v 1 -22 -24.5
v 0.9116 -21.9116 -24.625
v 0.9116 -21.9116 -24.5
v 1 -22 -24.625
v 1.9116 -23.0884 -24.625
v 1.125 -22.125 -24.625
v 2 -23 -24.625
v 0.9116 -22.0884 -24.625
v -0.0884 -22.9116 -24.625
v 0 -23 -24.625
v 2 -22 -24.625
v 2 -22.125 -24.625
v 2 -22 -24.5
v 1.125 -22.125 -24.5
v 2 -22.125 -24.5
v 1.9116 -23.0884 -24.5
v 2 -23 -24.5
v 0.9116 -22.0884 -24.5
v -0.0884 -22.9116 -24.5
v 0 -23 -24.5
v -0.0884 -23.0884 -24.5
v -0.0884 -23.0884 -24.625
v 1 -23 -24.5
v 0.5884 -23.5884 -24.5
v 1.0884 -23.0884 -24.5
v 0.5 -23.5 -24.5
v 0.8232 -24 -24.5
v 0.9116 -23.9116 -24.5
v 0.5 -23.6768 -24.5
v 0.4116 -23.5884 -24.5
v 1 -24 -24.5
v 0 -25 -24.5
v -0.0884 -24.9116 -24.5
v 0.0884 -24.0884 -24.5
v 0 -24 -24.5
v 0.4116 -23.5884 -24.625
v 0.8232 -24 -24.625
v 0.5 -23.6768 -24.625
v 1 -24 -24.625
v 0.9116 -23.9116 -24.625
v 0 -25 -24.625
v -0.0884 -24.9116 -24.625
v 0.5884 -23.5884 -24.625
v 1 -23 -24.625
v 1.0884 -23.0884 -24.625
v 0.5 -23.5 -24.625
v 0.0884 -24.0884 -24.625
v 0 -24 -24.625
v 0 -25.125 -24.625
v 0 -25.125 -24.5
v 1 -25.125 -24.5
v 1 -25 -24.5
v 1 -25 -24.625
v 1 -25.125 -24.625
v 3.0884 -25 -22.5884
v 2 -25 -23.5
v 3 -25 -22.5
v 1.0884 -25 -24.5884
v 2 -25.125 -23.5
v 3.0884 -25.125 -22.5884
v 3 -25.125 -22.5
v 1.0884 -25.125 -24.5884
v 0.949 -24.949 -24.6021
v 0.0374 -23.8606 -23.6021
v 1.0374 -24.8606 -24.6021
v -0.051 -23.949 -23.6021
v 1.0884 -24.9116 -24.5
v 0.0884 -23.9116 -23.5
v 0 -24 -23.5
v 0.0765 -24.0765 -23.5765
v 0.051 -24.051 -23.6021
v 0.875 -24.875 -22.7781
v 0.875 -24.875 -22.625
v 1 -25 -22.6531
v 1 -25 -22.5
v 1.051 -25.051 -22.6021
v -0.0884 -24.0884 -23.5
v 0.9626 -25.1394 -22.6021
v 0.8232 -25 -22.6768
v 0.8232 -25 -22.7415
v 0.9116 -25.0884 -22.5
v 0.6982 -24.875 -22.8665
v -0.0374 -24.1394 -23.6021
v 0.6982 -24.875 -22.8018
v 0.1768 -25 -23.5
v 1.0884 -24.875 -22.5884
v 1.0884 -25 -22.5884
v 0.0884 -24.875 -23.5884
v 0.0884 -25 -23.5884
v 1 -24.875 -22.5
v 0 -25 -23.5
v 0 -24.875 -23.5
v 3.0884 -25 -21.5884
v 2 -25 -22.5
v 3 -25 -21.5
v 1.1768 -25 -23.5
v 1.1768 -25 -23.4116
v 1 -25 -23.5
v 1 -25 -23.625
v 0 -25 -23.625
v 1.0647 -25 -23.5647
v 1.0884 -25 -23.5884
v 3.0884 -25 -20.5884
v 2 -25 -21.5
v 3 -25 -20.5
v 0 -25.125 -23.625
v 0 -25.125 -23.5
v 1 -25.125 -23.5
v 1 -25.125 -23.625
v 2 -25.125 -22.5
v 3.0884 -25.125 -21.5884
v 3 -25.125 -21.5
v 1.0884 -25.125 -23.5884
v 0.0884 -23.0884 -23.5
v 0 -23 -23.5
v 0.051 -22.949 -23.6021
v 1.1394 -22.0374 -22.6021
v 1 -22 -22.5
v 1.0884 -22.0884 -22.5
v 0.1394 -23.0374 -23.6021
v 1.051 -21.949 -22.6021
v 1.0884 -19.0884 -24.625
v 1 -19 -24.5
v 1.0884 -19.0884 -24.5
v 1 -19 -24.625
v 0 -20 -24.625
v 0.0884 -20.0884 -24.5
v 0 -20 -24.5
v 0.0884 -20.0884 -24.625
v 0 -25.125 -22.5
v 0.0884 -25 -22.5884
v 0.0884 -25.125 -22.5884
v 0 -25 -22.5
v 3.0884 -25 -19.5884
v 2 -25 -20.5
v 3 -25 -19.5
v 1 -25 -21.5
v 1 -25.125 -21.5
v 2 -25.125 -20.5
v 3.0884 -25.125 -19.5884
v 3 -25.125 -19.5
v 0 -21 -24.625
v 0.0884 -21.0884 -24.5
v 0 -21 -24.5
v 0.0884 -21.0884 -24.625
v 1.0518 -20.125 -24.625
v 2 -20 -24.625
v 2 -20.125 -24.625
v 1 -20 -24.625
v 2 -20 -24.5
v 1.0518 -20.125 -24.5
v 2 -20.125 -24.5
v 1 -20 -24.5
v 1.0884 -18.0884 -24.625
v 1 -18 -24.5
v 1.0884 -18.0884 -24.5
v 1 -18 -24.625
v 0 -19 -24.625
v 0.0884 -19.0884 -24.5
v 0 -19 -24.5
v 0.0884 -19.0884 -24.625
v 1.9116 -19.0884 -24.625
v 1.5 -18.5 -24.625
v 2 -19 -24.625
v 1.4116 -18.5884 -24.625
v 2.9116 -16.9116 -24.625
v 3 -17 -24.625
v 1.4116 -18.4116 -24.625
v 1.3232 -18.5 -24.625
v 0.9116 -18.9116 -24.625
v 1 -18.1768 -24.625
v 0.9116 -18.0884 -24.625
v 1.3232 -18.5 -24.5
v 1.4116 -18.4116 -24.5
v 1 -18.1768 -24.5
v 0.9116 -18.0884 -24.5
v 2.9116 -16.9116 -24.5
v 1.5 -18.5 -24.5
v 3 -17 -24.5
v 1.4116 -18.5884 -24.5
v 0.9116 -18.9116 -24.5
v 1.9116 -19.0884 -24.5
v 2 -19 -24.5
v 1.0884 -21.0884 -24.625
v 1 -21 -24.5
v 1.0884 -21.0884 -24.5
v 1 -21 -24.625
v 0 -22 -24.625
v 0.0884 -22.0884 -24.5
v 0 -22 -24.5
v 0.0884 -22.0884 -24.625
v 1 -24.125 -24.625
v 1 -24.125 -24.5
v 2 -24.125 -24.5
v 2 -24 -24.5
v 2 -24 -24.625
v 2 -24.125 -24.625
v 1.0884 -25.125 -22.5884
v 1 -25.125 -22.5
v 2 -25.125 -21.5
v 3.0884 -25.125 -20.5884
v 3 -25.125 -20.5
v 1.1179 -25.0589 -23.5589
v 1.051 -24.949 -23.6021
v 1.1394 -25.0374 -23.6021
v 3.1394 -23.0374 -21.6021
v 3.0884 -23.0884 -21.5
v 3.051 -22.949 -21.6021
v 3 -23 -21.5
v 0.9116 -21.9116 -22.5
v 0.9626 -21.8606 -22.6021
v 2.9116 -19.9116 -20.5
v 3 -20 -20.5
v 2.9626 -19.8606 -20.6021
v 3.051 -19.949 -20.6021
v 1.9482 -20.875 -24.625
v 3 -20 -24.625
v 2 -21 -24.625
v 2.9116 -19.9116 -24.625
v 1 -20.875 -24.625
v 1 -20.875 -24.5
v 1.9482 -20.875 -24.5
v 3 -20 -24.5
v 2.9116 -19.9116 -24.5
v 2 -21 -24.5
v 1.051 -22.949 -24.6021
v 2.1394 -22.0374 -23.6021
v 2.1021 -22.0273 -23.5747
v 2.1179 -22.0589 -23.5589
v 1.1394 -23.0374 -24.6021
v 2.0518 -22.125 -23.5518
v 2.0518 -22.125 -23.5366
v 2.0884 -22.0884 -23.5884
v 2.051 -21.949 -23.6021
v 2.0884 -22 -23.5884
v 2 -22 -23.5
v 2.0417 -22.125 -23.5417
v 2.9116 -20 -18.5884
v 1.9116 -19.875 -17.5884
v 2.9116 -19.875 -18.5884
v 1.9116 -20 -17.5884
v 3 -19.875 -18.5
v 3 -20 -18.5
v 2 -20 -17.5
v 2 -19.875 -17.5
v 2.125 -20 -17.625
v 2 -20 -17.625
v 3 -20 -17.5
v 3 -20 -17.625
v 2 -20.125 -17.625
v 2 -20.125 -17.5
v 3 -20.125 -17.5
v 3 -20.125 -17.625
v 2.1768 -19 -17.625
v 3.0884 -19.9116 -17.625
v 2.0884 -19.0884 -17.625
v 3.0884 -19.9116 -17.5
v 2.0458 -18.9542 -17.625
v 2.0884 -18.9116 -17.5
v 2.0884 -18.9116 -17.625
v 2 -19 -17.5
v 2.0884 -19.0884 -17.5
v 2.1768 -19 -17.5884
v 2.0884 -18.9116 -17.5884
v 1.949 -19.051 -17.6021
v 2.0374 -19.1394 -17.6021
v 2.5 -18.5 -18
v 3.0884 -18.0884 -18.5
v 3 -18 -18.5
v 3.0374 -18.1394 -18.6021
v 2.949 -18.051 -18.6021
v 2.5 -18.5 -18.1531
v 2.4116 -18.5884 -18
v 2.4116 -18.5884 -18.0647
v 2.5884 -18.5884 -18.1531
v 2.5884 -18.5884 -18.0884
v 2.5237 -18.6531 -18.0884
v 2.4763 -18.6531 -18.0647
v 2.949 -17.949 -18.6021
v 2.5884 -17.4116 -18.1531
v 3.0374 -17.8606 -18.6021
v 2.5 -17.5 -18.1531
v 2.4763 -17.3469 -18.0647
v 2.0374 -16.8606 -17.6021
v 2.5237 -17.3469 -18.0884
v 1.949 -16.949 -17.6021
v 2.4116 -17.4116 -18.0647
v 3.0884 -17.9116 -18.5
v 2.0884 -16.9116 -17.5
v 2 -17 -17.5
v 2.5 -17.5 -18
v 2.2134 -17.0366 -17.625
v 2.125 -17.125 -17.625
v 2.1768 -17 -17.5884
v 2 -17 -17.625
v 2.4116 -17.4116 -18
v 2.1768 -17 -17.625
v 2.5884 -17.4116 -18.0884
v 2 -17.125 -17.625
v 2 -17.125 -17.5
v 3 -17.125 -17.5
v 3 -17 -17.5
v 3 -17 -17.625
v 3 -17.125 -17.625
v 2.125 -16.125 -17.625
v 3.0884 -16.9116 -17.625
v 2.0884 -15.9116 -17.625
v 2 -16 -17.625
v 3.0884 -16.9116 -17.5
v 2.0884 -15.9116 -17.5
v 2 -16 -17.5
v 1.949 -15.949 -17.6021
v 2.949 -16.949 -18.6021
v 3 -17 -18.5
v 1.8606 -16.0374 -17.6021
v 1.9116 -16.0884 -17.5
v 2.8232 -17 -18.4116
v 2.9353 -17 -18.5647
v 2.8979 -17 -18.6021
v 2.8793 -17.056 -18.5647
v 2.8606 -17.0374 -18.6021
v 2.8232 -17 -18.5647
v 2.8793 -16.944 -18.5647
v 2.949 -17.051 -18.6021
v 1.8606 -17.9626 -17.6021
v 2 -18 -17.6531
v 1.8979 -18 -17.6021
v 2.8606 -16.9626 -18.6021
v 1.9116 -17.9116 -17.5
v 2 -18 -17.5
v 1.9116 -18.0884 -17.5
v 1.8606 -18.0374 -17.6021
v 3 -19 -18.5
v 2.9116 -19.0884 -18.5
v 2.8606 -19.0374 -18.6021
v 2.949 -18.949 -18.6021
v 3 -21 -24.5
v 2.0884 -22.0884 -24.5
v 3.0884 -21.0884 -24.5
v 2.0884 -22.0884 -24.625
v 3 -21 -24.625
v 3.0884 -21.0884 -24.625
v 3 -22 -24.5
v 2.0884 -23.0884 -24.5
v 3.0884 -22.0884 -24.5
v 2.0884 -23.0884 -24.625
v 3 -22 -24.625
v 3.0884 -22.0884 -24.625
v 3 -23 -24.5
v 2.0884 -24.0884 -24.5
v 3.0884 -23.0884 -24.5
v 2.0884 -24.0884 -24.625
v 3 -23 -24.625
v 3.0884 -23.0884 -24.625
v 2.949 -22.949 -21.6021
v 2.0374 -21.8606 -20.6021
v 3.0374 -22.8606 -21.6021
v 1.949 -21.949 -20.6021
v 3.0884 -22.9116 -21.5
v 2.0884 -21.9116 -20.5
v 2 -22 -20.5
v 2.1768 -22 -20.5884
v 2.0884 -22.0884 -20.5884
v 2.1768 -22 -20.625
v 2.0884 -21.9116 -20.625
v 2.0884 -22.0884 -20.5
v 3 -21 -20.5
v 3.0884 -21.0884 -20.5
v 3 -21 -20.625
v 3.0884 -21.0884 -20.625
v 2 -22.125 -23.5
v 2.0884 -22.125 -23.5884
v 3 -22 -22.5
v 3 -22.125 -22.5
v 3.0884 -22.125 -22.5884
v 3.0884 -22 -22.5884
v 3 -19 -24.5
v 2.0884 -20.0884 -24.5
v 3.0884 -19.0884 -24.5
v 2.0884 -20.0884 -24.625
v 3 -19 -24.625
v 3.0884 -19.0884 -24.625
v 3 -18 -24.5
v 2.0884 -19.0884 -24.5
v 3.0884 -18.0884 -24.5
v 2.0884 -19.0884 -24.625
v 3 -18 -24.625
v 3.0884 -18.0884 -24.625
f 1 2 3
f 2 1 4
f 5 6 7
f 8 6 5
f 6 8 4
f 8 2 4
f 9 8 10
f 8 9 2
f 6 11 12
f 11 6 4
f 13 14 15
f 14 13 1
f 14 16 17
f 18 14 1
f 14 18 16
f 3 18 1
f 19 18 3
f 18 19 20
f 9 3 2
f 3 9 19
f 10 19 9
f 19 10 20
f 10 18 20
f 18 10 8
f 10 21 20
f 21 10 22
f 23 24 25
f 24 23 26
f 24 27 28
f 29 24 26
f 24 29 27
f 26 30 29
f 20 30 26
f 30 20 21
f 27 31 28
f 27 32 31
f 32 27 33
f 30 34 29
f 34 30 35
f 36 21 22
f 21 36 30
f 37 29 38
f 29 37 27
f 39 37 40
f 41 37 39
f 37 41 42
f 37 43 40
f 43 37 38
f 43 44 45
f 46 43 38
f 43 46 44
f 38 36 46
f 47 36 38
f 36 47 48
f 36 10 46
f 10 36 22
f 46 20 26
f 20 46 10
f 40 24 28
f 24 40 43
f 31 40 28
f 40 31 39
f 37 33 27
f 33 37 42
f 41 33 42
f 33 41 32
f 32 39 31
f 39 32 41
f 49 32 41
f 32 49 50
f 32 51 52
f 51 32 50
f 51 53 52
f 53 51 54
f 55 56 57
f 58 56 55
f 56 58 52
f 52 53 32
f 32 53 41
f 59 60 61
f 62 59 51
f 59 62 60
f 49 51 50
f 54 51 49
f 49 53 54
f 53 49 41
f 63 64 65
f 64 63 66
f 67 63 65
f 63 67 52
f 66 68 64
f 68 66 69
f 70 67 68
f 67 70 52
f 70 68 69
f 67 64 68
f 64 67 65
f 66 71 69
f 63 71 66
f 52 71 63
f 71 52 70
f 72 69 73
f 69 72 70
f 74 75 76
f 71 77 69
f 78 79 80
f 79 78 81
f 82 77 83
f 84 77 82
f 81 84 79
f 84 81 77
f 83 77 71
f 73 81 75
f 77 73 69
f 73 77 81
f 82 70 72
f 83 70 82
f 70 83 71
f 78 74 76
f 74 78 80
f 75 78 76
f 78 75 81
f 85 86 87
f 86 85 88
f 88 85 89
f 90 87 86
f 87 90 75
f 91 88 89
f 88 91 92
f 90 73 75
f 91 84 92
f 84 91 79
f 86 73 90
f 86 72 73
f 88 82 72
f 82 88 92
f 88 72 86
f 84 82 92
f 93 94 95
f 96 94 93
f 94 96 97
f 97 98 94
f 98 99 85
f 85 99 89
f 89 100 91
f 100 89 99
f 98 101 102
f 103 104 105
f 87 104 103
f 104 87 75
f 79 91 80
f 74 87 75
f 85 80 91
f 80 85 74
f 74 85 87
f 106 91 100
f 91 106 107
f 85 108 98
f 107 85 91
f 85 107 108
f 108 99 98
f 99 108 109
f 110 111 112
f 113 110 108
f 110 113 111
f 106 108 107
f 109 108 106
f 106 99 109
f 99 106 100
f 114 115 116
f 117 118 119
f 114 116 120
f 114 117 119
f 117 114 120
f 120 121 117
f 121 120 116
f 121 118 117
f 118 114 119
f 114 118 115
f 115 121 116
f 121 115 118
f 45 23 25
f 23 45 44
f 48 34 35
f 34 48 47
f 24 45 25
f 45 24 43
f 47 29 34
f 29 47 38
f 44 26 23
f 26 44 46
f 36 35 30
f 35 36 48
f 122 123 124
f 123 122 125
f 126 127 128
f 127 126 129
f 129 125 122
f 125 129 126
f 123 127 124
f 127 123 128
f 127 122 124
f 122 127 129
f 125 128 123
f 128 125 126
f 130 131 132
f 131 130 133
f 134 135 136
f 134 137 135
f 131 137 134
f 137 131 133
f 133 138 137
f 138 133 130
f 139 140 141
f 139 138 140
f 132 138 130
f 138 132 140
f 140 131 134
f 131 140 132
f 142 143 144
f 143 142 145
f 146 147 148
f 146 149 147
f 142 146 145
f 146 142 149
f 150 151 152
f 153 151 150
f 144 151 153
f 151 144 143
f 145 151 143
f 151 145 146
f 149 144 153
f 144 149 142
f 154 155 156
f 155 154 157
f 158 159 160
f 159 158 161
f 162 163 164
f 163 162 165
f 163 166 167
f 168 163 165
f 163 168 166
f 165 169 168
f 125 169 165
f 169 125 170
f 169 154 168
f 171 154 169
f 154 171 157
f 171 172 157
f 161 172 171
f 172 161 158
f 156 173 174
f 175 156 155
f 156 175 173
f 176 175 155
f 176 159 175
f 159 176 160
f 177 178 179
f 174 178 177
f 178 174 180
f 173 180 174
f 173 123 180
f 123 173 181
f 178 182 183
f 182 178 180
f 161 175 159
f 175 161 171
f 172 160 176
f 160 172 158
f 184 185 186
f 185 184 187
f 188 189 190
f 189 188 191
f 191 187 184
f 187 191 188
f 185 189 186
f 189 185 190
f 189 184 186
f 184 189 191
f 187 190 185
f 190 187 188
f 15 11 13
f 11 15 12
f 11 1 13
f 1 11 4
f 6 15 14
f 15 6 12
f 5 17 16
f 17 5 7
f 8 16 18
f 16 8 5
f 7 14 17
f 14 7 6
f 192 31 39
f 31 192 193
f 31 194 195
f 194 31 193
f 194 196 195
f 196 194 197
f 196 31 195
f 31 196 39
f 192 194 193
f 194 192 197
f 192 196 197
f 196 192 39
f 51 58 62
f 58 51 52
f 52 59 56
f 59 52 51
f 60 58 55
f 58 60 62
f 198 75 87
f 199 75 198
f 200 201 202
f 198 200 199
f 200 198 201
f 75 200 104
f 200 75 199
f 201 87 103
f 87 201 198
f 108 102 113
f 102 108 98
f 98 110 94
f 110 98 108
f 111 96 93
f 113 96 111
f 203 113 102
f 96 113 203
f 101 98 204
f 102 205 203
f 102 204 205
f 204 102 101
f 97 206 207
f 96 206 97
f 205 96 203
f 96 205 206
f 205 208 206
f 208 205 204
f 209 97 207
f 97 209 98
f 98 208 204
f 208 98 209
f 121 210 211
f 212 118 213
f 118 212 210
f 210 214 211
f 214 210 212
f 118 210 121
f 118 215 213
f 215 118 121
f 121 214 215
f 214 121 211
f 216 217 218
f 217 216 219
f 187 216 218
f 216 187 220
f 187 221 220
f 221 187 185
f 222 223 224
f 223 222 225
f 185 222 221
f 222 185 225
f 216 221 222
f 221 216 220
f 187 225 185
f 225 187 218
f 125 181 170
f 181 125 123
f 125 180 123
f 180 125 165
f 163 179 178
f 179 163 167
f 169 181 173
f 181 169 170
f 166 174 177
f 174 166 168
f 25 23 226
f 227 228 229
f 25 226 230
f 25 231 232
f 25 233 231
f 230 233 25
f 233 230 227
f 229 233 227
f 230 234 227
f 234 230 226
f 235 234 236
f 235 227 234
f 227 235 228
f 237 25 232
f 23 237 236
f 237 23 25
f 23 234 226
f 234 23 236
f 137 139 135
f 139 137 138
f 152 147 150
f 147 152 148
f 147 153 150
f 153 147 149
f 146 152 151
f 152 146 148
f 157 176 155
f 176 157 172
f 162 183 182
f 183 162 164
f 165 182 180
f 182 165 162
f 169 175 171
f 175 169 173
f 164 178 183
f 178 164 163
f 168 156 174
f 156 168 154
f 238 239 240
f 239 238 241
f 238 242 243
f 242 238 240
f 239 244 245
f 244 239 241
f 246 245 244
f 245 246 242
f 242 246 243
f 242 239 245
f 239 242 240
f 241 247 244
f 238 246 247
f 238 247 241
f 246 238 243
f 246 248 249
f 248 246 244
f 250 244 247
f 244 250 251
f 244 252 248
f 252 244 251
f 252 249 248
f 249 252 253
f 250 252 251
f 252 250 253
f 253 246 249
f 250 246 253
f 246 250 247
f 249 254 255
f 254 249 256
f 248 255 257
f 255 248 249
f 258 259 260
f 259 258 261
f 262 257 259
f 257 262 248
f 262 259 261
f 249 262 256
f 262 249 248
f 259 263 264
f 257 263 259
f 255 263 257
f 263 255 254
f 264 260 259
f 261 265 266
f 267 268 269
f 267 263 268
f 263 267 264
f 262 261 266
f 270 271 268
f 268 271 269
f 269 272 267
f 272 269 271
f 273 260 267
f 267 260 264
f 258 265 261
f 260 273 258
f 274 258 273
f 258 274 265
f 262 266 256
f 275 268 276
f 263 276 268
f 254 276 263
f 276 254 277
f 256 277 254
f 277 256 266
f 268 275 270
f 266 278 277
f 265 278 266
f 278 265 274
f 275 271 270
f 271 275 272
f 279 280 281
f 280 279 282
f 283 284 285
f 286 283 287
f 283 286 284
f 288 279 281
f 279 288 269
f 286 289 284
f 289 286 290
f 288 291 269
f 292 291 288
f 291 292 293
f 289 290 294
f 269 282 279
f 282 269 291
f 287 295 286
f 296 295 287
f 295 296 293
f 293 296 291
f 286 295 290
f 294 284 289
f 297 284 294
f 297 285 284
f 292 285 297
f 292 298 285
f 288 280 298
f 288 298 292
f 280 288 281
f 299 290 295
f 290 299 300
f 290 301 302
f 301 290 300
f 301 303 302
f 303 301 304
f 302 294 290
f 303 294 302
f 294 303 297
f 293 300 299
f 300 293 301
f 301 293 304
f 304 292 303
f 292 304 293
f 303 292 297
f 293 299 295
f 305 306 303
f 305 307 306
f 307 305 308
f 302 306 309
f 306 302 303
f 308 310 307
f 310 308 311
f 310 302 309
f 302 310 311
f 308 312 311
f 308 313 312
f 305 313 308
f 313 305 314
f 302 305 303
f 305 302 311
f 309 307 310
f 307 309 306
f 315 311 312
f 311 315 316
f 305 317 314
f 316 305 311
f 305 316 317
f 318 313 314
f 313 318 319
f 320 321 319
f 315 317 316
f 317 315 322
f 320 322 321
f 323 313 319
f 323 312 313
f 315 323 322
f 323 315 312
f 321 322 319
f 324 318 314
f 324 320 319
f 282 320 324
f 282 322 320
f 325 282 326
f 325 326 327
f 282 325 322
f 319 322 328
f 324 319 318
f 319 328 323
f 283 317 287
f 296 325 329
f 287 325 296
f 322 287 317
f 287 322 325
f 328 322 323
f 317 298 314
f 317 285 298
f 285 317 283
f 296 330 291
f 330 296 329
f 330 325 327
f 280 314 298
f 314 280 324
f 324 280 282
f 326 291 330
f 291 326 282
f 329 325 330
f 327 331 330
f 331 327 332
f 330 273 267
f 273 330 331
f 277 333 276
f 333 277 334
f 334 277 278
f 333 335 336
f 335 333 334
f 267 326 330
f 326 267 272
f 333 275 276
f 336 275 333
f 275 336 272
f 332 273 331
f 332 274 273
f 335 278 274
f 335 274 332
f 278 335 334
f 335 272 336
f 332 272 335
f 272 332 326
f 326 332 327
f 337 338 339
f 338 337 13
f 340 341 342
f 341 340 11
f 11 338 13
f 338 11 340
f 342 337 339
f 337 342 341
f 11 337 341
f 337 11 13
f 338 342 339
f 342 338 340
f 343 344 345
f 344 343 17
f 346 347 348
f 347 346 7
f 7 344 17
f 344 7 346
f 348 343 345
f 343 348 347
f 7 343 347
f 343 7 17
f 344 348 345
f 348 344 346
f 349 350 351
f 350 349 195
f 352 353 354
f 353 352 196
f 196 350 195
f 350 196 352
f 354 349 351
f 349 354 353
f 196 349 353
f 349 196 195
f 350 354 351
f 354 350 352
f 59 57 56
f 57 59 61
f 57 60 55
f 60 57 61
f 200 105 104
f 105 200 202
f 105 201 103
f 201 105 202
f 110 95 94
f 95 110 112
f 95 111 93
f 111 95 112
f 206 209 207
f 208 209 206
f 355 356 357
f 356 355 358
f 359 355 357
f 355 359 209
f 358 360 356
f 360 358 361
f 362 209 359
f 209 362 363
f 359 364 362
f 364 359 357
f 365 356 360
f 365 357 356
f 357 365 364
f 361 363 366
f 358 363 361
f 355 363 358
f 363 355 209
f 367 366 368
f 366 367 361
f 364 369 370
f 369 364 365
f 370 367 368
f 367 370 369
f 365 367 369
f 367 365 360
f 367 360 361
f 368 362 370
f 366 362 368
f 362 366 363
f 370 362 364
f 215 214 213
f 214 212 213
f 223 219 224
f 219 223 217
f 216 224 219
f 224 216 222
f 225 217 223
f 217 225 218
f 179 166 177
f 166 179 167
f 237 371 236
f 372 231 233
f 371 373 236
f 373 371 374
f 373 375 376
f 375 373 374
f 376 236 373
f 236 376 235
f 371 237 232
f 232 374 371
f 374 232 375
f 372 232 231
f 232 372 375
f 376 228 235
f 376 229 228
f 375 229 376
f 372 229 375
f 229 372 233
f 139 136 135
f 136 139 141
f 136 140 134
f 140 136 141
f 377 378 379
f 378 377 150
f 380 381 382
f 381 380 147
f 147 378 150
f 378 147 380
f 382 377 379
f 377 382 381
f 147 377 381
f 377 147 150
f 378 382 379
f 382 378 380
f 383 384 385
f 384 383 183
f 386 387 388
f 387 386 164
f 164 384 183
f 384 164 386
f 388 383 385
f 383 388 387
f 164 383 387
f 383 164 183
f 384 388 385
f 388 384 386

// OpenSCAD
translate(v = [-0.5, -0.5, 0]) {
	/*Shell 0*/
	union() {
		%/*Nodes shell 0*/
		union() {
			/*Node $_147*/
			color(alpha = 0.1, c = "lightgreen") {
				translate(v = [0, -23, -25]) {
					cube(size = [1, 1, 1]);
				}
			}
			/*Node $_149*/
			color(alpha = 0.1, c = "lightgreen") {
				translate(v = [0, -25, -25]) {
					cube(size = [1, 1, 1]);
				}
			}
			/*Node $_151*/
			color(alpha = 0.1, c = "lightgreen") {
				translate(v = [0, -24, -24]) {
					cube(size = [1, 1, 1]);
				}
			}
			/*Node $_153*/
			color(alpha = 0.1, c = "lightgreen") {
				translate(v = [0, -25, -24]) {
					cube(size = [1, 1, 1]);
				}
			}
			/*Node $_41__0*/
			color(alpha = 0.1, c = "lightblue") {
				translate(v = [0, -23, -24]) {
					cube(size = [1, 1, 1]);
				}
			}
			/*Node $_39__0*/
			color(alpha = 0.1, c = "lightblue") {
				translate(v = [0, -24, -25]) {
					cube(size = [1, 1, 1]);
				}
			}
			/*Node $_44__0*/
			color(alpha = 0.1, c = "lightblue") {
				translate(v = [0, -20, -25]) {
					cube(size = [1, 1, 1]);
				}
			}
			/*Node $_38__0*/
			color(alpha = 0.1, c = "lightblue") {
				translate(v = [0, -25, -23]) {
					cube(size = [1, 1, 1]);
				}
			}
			/*Node $_42__0*/
			color(alpha = 0.1, c = "lightblue") {
				translate(v = [0, -21, -25]) {
					cube(size = [1, 1, 1]);
				}
			}
			/*Node $_40__0*/
			color(alpha = 0.1, c = "lightblue") {
				translate(v = [0, -19, -25]) {
					cube(size = [1, 1, 1]);
				}
			}
			/*Node $_43__0*/
			color(alpha = 0.1, c = "lightblue") {
				translate(v = [0, -22, -25]) {
					cube(size = [1, 1, 1]);
				}
			}
		}
		/*Edges shell 0*/
		union() {
			/*Edge 147 from $and$benchmarks/c432.v:170$355 to $_147*/
			translate(v = [0.5, -22.5, -24.5]) {
				rotate(a = [0, 90.0, 45.0]) {
					cube(size = [0.125, 0.125, 1.4142135623730951]);
				}
			}
			/*Edge 147 from $_147 to $and$benchmarks/c432.v:170$356*/
			translate(v = [1.5, -23.5, -24.5]) {
				rotate(a = [0, 90.0, 135.0]) {
					cube(size = [0.125, 0.125, 1.4142135623730951]);
				}
			}
			/*Edge 149 from $and$benchmarks/c432.v:170$356 to $_149*/
			translate(v = [0.5, -24.5, -24.5]) {
				rotate(a = [0, 90.0, 45.0]) {
					cube(size = [0.125, 0.125, 1.4142135623730951]);
				}
			}
			/*Edge 149 from $_149 to $and$benchmarks/c432.v:170$357*/
			translate(v = [1.5, -24.5, -24.5]) {
				rotate(a = [0, 90.0, 180.0]) {
					cube(size = [0.125, 0.125, 1.0]);
				}
			}
			/*Edge 151 from $and$benchmarks/c432.v:170$357 to $_151*/
			translate(v = [0.5, -23.5, -23.5]) {
				rotate(a = [0, 125.26438968275465, -45.0]) {
					cube(size = [0.125, 0.125, 1.7320508075688772]);
				}
			}
			/*Edge 151 from $_151 to $and$benchmarks/c432.v:170$358*/
			translate(v = [1.5, -24.5, -22.5]) {
				rotate(a = [0, 125.26438968275465, 135.0]) {
					cube(size = [0.125, 0.125, 1.7320508075688772]);
				}
			}
			/*Edge 153 from $and$benchmarks/c432.v:170$358 to $_153*/
			translate(v = [0.5, -24.5, -23.5]) {
				rotate(a = [0, 45.00000000000001, 0.0]) {
					cube(size = [0.125, 0.125, 1.4142135623730951]);
				}
			}
			/*Edge 153 from $_153 to $and$benchmarks/c432.v:170$359*/
			translate(v = [1.5, -24.5, -23.5]) {
				rotate(a = [0, 90.0, 180.0]) {
					cube(size = [0.125, 0.125, 1.0]);
				}
			}
			/*Edge -1 from $_41__0 to $_41__1*/
			translate(v = [1.5, -21.5, -22.5]) {
				rotate(a = [0, 125.26438968275465, -135.0]) {
					cube(size = [0.125, 0.125, 1.7320508075688772]);
				}
			}
			/*Edge -1 from $_39__0 to $_39__1*/
			translate(v = [1.5, -22.5, -24.5]) {
				rotate(a = [0, 90.0, -135.0]) {
					cube(size = [0.125, 0.125, 1.4142135623730951]);
				}
			}
			/*Edge -1 from $_44__0 to $_44__1*/
			translate(v = [1.5, -18.5, -24.5]) {
				rotate(a = [0, 90.0, -135.0]) {
					cube(size = [0.125, 0.125, 1.4142135623730951]);
				}
			}
			/*Edge -1 from $_38__0 to $_38__1*/
			translate(v = [1.5, -24.5, -21.5]) {
				rotate(a = [0, 135.0, 180.0]) {
					cube(size = [0.125, 0.125, 1.4142135623730951]);
				}
			}
			/*Edge -1 from $_42__0 to $_42__1*/
			translate(v = [1.5, -19.5, -24.5]) {
				rotate(a = [0, 90.0, -135.0]) {
					cube(size = [0.125, 0.125, 1.4142135623730951]);
				}
			}
			/*Edge -1 from $_40__0 to $_40__1*/
			translate(v = [1.5, -17.5, -24.5]) {
				rotate(a = [0, 90.0, -135.0]) {
					cube(size = [0.125, 0.125, 1.4142135623730951]);
				}
			}
			/*Edge -1 from $_43__0 to $_43__1*/
			translate(v = [1.5, -20.5, -24.5]) {
				rotate(a = [0, 90.0, -135.0]) {
					cube(size = [0.125, 0.125, 1.4142135623730951]);
				}
			}
		}
	}
	/*Shell 1*/
	union() {
		%/*Nodes shell 1*/
		union() {
			/*Node $and$benchmarks/c432.v:170$355*/
			color(alpha = 0.1, c = "black") {
				translate(v = [1, -22, -25]) {
					cube(size = [1, 1, 1]);
				}
			}
			/*Node $and$benchmarks/c432.v:170$356*/
			color(alpha = 0.1, c = "black") {
				translate(v = [1, -24, -25]) {
					cube(size = [1, 1, 1]);
				}
			}
			/*Node $and$benchmarks/c432.v:170$357*/
			color(alpha = 0.1, c = "black") {
				translate(v = [1, -25, -25]) {
					cube(size = [1, 1, 1]);
				}
			}
			/*Node $and$benchmarks/c432.v:170$358*/
			color(alpha = 0.1, c = "black") {
				translate(v = [1, -25, -23]) {
					cube(size = [1, 1, 1]);
				}
			}
			/*Node $and$benchmarks/c432.v:170$359*/
			color(alpha = 0.1, c = "black") {
				translate(v = [1, -25, -24]) {
					cube(size = [1, 1, 1]);
				}
			}
			/*Node $_41__1*/
			color(alpha = 0.1, c = "lightblue") {
				translate(v = [1, -22, -23]) {
					cube(size = [1, 1, 1]);
				}
			}
			/*Node $_39__1*/
			color(alpha = 0.1, c = "lightblue") {
				translate(v = [1, -23, -25]) {
					cube(size = [1, 1, 1]);
				}
			}
			/*Node $_44__1*/
			color(alpha = 0.1, c = "lightblue") {
				translate(v = [1, -19, -25]) {
					cube(size = [1, 1, 1]);
				}
			}
			/*Node $_38__1*/
			color(alpha = 0.1, c = "lightblue") {
				translate(v = [1, -25, -22]) {
					cube(size = [1, 1, 1]);
				}
			}
			/*Node $_42__1*/
			color(alpha = 0.1, c = "lightblue") {
				translate(v = [1, -20, -25]) {
					cube(size = [1, 1, 1]);
				}
			}
			/*Node $_40__1*/
			color(alpha = 0.1, c = "lightblue") {
				translate(v = [1, -18, -25]) {
					cube(size = [1, 1, 1]);
				}
			}
			/*Node $_43__1*/
			color(alpha = 0.1, c = "lightblue") {
				translate(v = [1, -21, -25]) {
					cube(size = [1, 1, 1]);
				}
			}
		}
		/*Edges shell 1*/
		union() {
			/*Edge 145 from $and$benchmarks/c432.v:170$355 to $_145*/
			translate(v = [2.5, -21.5, -24.5]) {
				rotate(a = [0, 90.0, 180.0]) {
					cube(size = [0.125, 0.125, 1.0]);
				}
			}
			/*Edge 146 from $and$benchmarks/c432.v:170$355 to $_146*/
			translate(v = [2.5, -22.5, -24.5]) {
				rotate(a = [0, 90.0, 135.0]) {
					cube(size = [0.125, 0.125, 1.4142135623730951]);
				}
			}
			/*Edge 148 from $and$benchmarks/c432.v:170$356 to $_148*/
			translate(v = [2.5, -23.5, -24.5]) {
				rotate(a = [0, 90.0, 180.0]) {
					cube(size = [0.125, 0.125, 1.0]);
				}
			}
			/*Edge 150 from $and$benchmarks/c432.v:170$357 to $_150*/
			translate(v = [2.5, -24.5, -23.5]) {
				rotate(a = [0, 135.0, 180.0]) {
					cube(size = [0.125, 0.125, 1.4142135623730951]);
				}
			}
			/*Edge 152 from $and$benchmarks/c432.v:170$358 to $_152*/
			translate(v = [2.5, -24.5, -21.5]) {
				rotate(a = [0, 135.0, 180.0]) {
					cube(size = [0.125, 0.125, 1.4142135623730951]);
				}
			}
			/*Edge 154 from $and$benchmarks/c432.v:170$359 to $_154*/
			translate(v = [2.5, -24.5, -22.5]) {
				rotate(a = [0, 135.0, 180.0]) {
					cube(size = [0.125, 0.125, 1.4142135623730951]);
				}
			}
			/*Edge 155 from $and$benchmarks/c432.v:170$359 to $_155*/
			translate(v = [2.5, -23.5, -22.5]) {
				rotate(a = [0, 125.26438968275465, -135.0]) {
					cube(size = [0.125, 0.125, 1.7320508075688772]);
				}
			}
			/*Edge -1 from $_41 to $_41__1*/
			translate(v = [1.5, -21.5, -22.5]) {
				rotate(a = [0, 54.735610317245346, 45.0]) {
					cube(size = [0.125, 0.125, 1.7320508075688772]);
				}
			}
			/*Edge -1 from $_43 to $_43__1*/
			translate(v = [1.5, -20.5, -24.5]) {
				rotate(a = [0, 90.0, 0.0]) {
					cube(size = [0.125, 0.125, 1.0]);
				}
			}
			/*Edge -1 from $_44 to $_44__1*/
			translate(v = [1.5, -18.5, -24.5]) {
				rotate(a = [0, 90.0, 45.0]) {
					cube(size = [0.125, 0.125, 1.4142135623730951]);
				}
			}
			/*Edge -1 from $_39__1 to $_39__2*/
			translate(v = [2.5, -21.5, -23.5]) {
				rotate(a = [0, 125.26438968275465, -135.0]) {
					cube(size = [0.125, 0.125, 1.7320508075688772]);
				}
			}
			/*Edge -1 from $_38__1 to $_38__2*/
			translate(v = [2.5, -24.5, -20.5]) {
				rotate(a = [0, 135.0, 180.0]) {
					cube(size = [0.125, 0.125, 1.4142135623730951]);
				}
			}
			/*Edge -1 from $_42__1 to $_42__2*/
			translate(v = [2.5, -19.5, -24.5]) {
				rotate(a = [0, 90.0, 180.0]) {
					cube(size = [0.125, 0.125, 1.0]);
				}
			}
			/*Edge -1 from $_40__1 to $_40__2*/
			translate(v = [2.5, -18.5, -24.5]) {
				rotate(a = [0, 90.0, 135.0]) {
					cube(size = [0.125, 0.125, 1.4142135623730951]);
				}
			}
		}
	}
	/*Shell 2*/
	union() {
		%/*Nodes shell 2*/
		union() {
			/*Node $_102*/
			color(alpha = 0.1, c = "lightgreen") {
				translate(v = [2, -20, -18]) {
					cube(size = [1, 1, 1]);
				}
			}
			/*Node $_104*/
			color(alpha = 0.1, c = "lightgreen") {
				translate(v = [2, -19, -18]) {
					cube(size = [1, 1, 1]);
				}
			}
			/*Node $_106*/
			color(alpha = 0.1, c = "lightgreen") {
				translate(v = [2, -17, -18]) {
					cube(size = [1, 1, 1]);
				}
			}
			/*Node $_108*/
			color(alpha = 0.1, c = "lightgreen") {
				translate(v = [2, -16, -18]) {
					cube(size = [1, 1, 1]);
				}
			}
			/*Node $_110*/
			color(alpha = 0.1, c = "lightgreen") {
				translate(v = [2, -18, -18]) {
					cube(size = [1, 1, 1]);
				}
			}
			/*Node $_145*/
			color(alpha = 0.1, c = "lightgreen") {
				translate(v = [2, -22, -25]) {
					cube(size = [1, 1, 1]);
				}
			}
			/*Node $_146*/
			color(alpha = 0.1, c = "lightgreen") {
				translate(v = [2, -23, -25]) {
					cube(size = [1, 1, 1]);
				}
			}
			/*Node $_148*/
			color(alpha = 0.1, c = "lightgreen") {
				translate(v = [2, -24, -25]) {
					cube(size = [1, 1, 1]);
				}
			}
			/*Node $_150*/
			color(alpha = 0.1, c = "lightgreen") {
				translate(v = [2, -25, -24]) {
					cube(size = [1, 1, 1]);
				}
			}
			/*Node $_152*/
			color(alpha = 0.1, c = "lightgreen") {
				translate(v = [2, -25, -22]) {
					cube(size = [1, 1, 1]);
				}
			}
			/*Node $_154*/
			color(alpha = 0.1, c = "lightgreen") {
				translate(v = [2, -25, -23]) {
					cube(size = [1, 1, 1]);
				}
			}
			/*Node $_155*/
			color(alpha = 0.1, c = "lightgreen") {
				translate(v = [2, -24, -23]) {
					cube(size = [1, 1, 1]);
				}
			}
			/*Node $_156*/
			color(alpha = 0.1, c = "lightgreen") {
				translate(v = [2, -22, -21]) {
					cube(size = [1, 1, 1]);
				}
			}
			/*Node $_41*/
			color(alpha = 0.1, c = "pink") {
				translate(v = [2, -21, -22]) {
					cube(size = [1, 1, 1]);
				}
			}
			/*Node $_43*/
			color(alpha = 0.1, c = "pink") {
				translate(v = [2, -21, -25]) {
					cube(size = [1, 1, 1]);
				}
			}
			/*Node $_44*/
			color(alpha = 0.1, c = "pink") {
				translate(v = [2, -18, -25]) {
					cube(size = [1, 1, 1]);
				}
			}
			/*Node $_39__2*/
			color(alpha = 0.1, c = "lightblue") {
				translate(v = [2, -22, -24]) {
					cube(size = [1, 1, 1]);
				}
			}
			/*Node $_38__2*/
			color(alpha = 0.1, c = "lightblue") {
				translate(v = [2, -25, -21]) {
					cube(size = [1, 1, 1]);
				}
			}
			/*Node $_42__2*/
			color(alpha = 0.1, c = "lightblue") {
				translate(v = [2, -20, -25]) {
					cube(size = [1, 1, 1]);
				}
			}
			/*Node $_40__2*/
			color(alpha = 0.1, c = "lightblue") {
				translate(v = [2, -19, -25]) {
					cube(size = [1, 1, 1]);
				}
			}
		}
		/*Edges shell 2*/
		union() {
			/*Edge 102 from $and$benchmarks/c432.v:130$302 to $_102*/
			translate(v = [2.5, -19.5, -17.5]) {
				rotate(a = [0, 135.0, 0.0]) {
					cube(size = [0.125, 0.125, 1.4142135623730951]);
				}
			}
			/*Edge 102 from $_102 to $and$benchmarks/c432.v:130$303*/
			translate(v = [3.5, -19.5, -17.5]) {
				rotate(a = [0, 90.0, 180.0]) {
					cube(size = [0.125, 0.125, 1.0]);
				}
			}
			/*Edge 104 from $and$benchmarks/c432.v:130$303 to $_104*/
			translate(v = [2.5, -18.5, -17.5]) {
				rotate(a = [0, 90.0, -45.0]) {
					cube(size = [0.125, 0.125, 1.4142135623730951]);
				}
			}
			/*Edge 104 from $_104 to $and$benchmarks/c432.v:130$304*/
			translate(v = [3.5, -17.5, -18.5]) {
				rotate(a = [0, 54.735610317245346, -135.0]) {
					cube(size = [0.125, 0.125, 1.7320508075688772]);
				}
			}
			/*Edge 106 from $and$benchmarks/c432.v:130$304 to $_106*/
			translate(v = [2.5, -16.5, -17.5]) {
				rotate(a = [0, 125.26438968275465, -45.0]) {
					cube(size = [0.125, 0.125, 1.7320508075688772]);
				}
			}
			/*Edge 106 from $_106 to $and$benchmarks/c432.v:130$305*/
			translate(v = [3.5, -16.5, -17.5]) {
				rotate(a = [0, 90.0, 180.0]) {
					cube(size = [0.125, 0.125, 1.0]);
				}
			}
			/*Edge 108 from $and$benchmarks/c432.v:130$305 to $_108*/
			translate(v = [2.5, -15.5, -17.5]) {
				rotate(a = [0, 90.0, -45.0]) {
					cube(size = [0.125, 0.125, 1.4142135623730951]);
				}
			}
			/*Edge 108 from $_108 to $and$benchmarks/c432.v:130$306*/
			translate(v = [3.5, -16.5, -18.5]) {
				rotate(a = [0, 54.735610317245346, 135.0]) {
					cube(size = [0.125, 0.125, 1.7320508075688772]);
				}
			}
			/*Edge 110 from $and$benchmarks/c432.v:130$306 to $_110*/
			translate(v = [2.5, -17.5, -17.5]) {
				rotate(a = [0, 125.26438968275465, 45.0]) {
					cube(size = [0.125, 0.125, 1.7320508075688772]);
				}
			}
			/*Edge 110 from $_110 to $and$benchmarks/c432.v:130$307*/
			translate(v = [3.5, -18.5, -18.5]) {
				rotate(a = [0, 54.735610317245346, 135.0]) {
					cube(size = [0.125, 0.125, 1.7320508075688772]);
				}
			}
			/*Edge 145 from $_145 to $not$benchmarks/c432.v:0$338*/
			translate(v = [3.5, -20.5, -24.5]) {
				rotate(a = [0, 90.0, -135.0]) {
					cube(size = [0.125, 0.125, 1.4142135623730951]);
				}
			}
			/*Edge 146 from $_146 to $not$benchmarks/c432.v:0$340*/
			translate(v = [3.5, -21.5, -24.5]) {
				rotate(a = [0, 90.0, -135.0]) {
					cube(size = [0.125, 0.125, 1.4142135623730951]);
				}
			}
			/*Edge 148 from $_148 to $not$benchmarks/c432.v:0$342*/
			translate(v = [3.5, -22.5, -24.5]) {
				rotate(a = [0, 90.0, -135.0]) {
					cube(size = [0.125, 0.125, 1.4142135623730951]);
				}
			}
			/*Edge 150 from $_150 to $not$benchmarks/c432.v:0$344*/
			translate(v = [3.5, -24.5, -22.5]) {
				rotate(a = [0, 135.0, 180.0]) {
					cube(size = [0.125, 0.125, 1.4142135623730951]);
				}
			}
			/*Edge 152 from $_152 to $not$benchmarks/c432.v:0$346*/
			translate(v = [3.5, -24.5, -20.5]) {
				rotate(a = [0, 135.0, 180.0]) {
					cube(size = [0.125, 0.125, 1.4142135623730951]);
				}
			}
			/*Edge 154 from $_154 to $not$benchmarks/c432.v:0$348*/
			translate(v = [3.5, -24.5, -21.5]) {
				rotate(a = [0, 135.0, 180.0]) {
					cube(size = [0.125, 0.125, 1.4142135623730951]);
				}
			}
			/*Edge 155 from $_155 to $and$benchmarks/c432.v:170$360*/
			translate(v = [3.5, -22.5, -21.5]) {
				rotate(a = [0, 125.26438968275465, -135.0]) {
					cube(size = [0.125, 0.125, 1.7320508075688772]);
				}
			}
			/*Edge 156 from $and$benchmarks/c432.v:170$360 to $_156*/
			translate(v = [2.5, -21.5, -20.5]) {
				rotate(a = [0, 125.26438968275465, -45.0]) {
					cube(size = [0.125, 0.125, 1.7320508075688772]);
				}
			}
			/*Edge 156 from $_156 to $not$benchmarks/c432.v:0$350*/
			translate(v = [3.5, -20.5, -20.5]) {
				rotate(a = [0, 90.0, -135.0]) {
					cube(size = [0.125, 0.125, 1.4142135623730951]);
				}
			}
			/*Edge 41 from $not$benchmarks/c432.v:0$425 to $_41*/
			translate(v = [2.5, -20.5, -21.5]) {
				rotate(a = [0, 54.735610317245346, 45.0]) {
					cube(size = [0.125, 0.125, 1.7320508075688772]);
				}
			}
			/*Edge 43 from $not$benchmarks/c432.v:0$446 to $_43*/
			translate(v = [2.5, -20.5, -24.5]) {
				rotate(a = [0, 90.0, 45.0]) {
					cube(size = [0.125, 0.125, 1.4142135623730951]);
				}
			}
			/*Edge 44 from $not$benchmarks/c432.v:0$450 to $_44*/
			translate(v = [2.5, -17.5, -24.5]) {
				rotate(a = [0, 90.0, 45.0]) {
					cube(size = [0.125, 0.125, 1.4142135623730951]);
				}
			}
			/*Edge -1 from $_39__2 to $_39__3*/
			translate(v = [3.5, -21.5, -22.5]) {
				rotate(a = [0, 135.0, 180.0]) {
					cube(size = [0.125, 0.125, 1.4142135623730951]);
				}
			}
			/*Edge -1 from $_38__2 to $_38__3*/
			translate(v = [3.5, -24.5, -19.5]) {
				rotate(a = [0, 135.0, 180.0]) {
					cube(size = [0.125, 0.125, 1.4142135623730951]);
				}
			}
			/*Edge -1 from $_42__2 to $_42__3*/
			translate(v = [3.5, -18.5, -24.5]) {
				rotate(a = [0, 90.0, -135.0]) {
					cube(size = [0.125, 0.125, 1.4142135623730951]);
				}
			}
			/*Edge -1 from $_40__2 to $_40__3*/
			translate(v = [3.5, -17.5, -24.5]) {
				rotate(a = [0, 90.0, -135.0]) {
					cube(size = [0.125, 0.125, 1.4142135623730951]);
				}
			}
		}
	}
	/*Shell 3*/
	union() {
		%/*Nodes shell 3*/
		union() {
			/*Node $and$benchmarks/c432.v:130$302*/
			color(alpha = 0.1, c = "black") {
				translate(v = [3, -20, -19]) {
					cube(size = [1, 1, 1]);
				}
			}
			/*Node $and$benchmarks/c432.v:130$303*/
			color(alpha = 0.1, c = "black") {
				translate(v = [3, -20, -18]) {
					cube(size = [1, 1, 1]);
				}
			}
			/*Node $and$benchmarks/c432.v:130$304*/
			color(alpha = 0.1, c = "black") {
				translate(v = [3, -18, -19]) {
					cube(size = [1, 1, 1]);
				}
			}
			/*Node $and$benchmarks/c432.v:130$305*/
			color(alpha = 0.1, c = "black") {
				translate(v = [3, -17, -18]) {
					cube(size = [1, 1, 1]);
				}
			}
			/*Node $and$benchmarks/c432.v:130$306*/
			color(alpha = 0.1, c = "black") {
				translate(v = [3, -17, -19]) {
					cube(size = [1, 1, 1]);
				}
			}
			/*Node $and$benchmarks/c432.v:130$307*/
			color(alpha = 0.1, c = "black") {
				translate(v = [3, -19, -19]) {
					cube(size = [1, 1, 1]);
				}
			}
			/*Node $and$benchmarks/c432.v:170$360*/
			color(alpha = 0.1, c = "black") {
				translate(v = [3, -23, -22]) {
					cube(size = [1, 1, 1]);
				}
			}
			/*Node $not$benchmarks/c432.v:0$338*/
			color(alpha = 0.1, c = "black") {
				translate(v = [3, -21, -25]) {
					cube(size = [1, 1, 1]);
				}
			}
			/*Node $not$benchmarks/c432.v:0$340*/
			color(alpha = 0.1, c = "black") {
				translate(v = [3, -22, -25]) {
					cube(size = [1, 1, 1]);
				}
			}
			/*Node $not$benchmarks/c432.v:0$342*/
			color(alpha = 0.1, c = "black") {
				translate(v = [3, -23, -25]) {
					cube(size = [1, 1, 1]);
				}
			}
			/*Node $not$benchmarks/c432.v:0$344*/
			color(alpha = 0.1, c = "black") {
				translate(v = [3, -25, -23]) {
					cube(size = [1, 1, 1]);
				}
			}
			/*Node $not$benchmarks/c432.v:0$346*/
			color(alpha = 0.1, c = "black") {
				translate(v = [3, -25, -21]) {
					cube(size = [1, 1, 1]);
				}
			}
			/*Node $not$benchmarks/c432.v:0$348*/
			color(alpha = 0.1, c = "black") {
				translate(v = [3, -25, -22]) {
					cube(size = [1, 1, 1]);
				}
			}
			/*Node $not$benchmarks/c432.v:0$350*/
			color(alpha = 0.1, c = "black") {
				translate(v = [3, -21, -21]) {
					cube(size = [1, 1, 1]);
				}
			}
			/*Node $not$benchmarks/c432.v:0$352*/
			color(alpha = 0.1, c = "black") {
				translate(v = [3, -21, -20]) {
					cube(size = [1, 1, 1]);
				}
			}
			/*Node $not$benchmarks/c432.v:0$425*/
			color(alpha = 0.1, c = "black") {
				translate(v = [3, -20, -21]) {
					cube(size = [1, 1, 1]);
				}
			}
			/*Node $not$benchmarks/c432.v:0$446*/
			color(alpha = 0.1, c = "black") {
				translate(v = [3, -20, -25]) {
					cube(size = [1, 1, 1]);
				}
			}
			/*Node $not$benchmarks/c432.v:0$450*/
			color(alpha = 0.1, c = "black") {
				translate(v = [3, -17, -25]) {
					cube(size = [1, 1, 1]);
				}
			}
			/*Node $_39__3*/
			color(alpha = 0.1, c = "lightblue") {
				translate(v = [3, -22, -23]) {
					cube(size = [1, 1, 1]);
				}
			}
			/*Node $_38__3*/
			color(alpha = 0.1, c = "lightblue") {
				translate(v = [3, -25, -20]) {
					cube(size = [1, 1, 1]);
				}
			}
			/*Node $_42__3*/
			color(alpha = 0.1, c = "lightblue") {
				translate(v = [3, -19, -25]) {
					cube(size = [1, 1, 1]);
				}
			}
			/*Node $_40__3*/
			color(alpha = 0.1, c = "lightblue") {
				translate(v = [3, -18, -25]) {
					cube(size = [1, 1, 1]);
				}
			}
		}
		/*Edges shell 3*/
		union();
	}
	/*Shell 4*/
	union() {
		%/*Nodes shell 4*/
		union();
		/*Edges shell 4*/
		union();
	}
	/*Shell 5*/
	union() {
		%/*Nodes shell 5*/
		union();
		/*Edges shell 5*/
		union();
	}
	/*Shell 6*/
	union() {
		%/*Nodes shell 6*/
		union();
		/*Edges shell 6*/
		union();
	}
	/*Shell 7*/
	union() {
		%/*Nodes shell 7*/
		union();
		/*Edges shell 7*/
		union();
	}
	/*Shell 8*/
	union() {
		%/*Nodes shell 8*/
		union();
		/*Edges shell 8*/
		union();
	}
	/*Shell 9*/
	union() {
		%/*Nodes shell 9*/
		union();
		/*Edges shell 9*/
		union();
	}
	/*Shell 10*/
	union() {
		%/*Nodes shell 10*/
		union();
		/*Edges shell 10*/
		union();
	}
	/*Shell 11*/
	union() {
		%/*Nodes shell 11*/
		union();
		/*Edges shell 11*/
		union();
	}
	/*Shell 12*/
	union() {
		%/*Nodes shell 12*/
		union();
		/*Edges shell 12*/
		union();
	}
}
